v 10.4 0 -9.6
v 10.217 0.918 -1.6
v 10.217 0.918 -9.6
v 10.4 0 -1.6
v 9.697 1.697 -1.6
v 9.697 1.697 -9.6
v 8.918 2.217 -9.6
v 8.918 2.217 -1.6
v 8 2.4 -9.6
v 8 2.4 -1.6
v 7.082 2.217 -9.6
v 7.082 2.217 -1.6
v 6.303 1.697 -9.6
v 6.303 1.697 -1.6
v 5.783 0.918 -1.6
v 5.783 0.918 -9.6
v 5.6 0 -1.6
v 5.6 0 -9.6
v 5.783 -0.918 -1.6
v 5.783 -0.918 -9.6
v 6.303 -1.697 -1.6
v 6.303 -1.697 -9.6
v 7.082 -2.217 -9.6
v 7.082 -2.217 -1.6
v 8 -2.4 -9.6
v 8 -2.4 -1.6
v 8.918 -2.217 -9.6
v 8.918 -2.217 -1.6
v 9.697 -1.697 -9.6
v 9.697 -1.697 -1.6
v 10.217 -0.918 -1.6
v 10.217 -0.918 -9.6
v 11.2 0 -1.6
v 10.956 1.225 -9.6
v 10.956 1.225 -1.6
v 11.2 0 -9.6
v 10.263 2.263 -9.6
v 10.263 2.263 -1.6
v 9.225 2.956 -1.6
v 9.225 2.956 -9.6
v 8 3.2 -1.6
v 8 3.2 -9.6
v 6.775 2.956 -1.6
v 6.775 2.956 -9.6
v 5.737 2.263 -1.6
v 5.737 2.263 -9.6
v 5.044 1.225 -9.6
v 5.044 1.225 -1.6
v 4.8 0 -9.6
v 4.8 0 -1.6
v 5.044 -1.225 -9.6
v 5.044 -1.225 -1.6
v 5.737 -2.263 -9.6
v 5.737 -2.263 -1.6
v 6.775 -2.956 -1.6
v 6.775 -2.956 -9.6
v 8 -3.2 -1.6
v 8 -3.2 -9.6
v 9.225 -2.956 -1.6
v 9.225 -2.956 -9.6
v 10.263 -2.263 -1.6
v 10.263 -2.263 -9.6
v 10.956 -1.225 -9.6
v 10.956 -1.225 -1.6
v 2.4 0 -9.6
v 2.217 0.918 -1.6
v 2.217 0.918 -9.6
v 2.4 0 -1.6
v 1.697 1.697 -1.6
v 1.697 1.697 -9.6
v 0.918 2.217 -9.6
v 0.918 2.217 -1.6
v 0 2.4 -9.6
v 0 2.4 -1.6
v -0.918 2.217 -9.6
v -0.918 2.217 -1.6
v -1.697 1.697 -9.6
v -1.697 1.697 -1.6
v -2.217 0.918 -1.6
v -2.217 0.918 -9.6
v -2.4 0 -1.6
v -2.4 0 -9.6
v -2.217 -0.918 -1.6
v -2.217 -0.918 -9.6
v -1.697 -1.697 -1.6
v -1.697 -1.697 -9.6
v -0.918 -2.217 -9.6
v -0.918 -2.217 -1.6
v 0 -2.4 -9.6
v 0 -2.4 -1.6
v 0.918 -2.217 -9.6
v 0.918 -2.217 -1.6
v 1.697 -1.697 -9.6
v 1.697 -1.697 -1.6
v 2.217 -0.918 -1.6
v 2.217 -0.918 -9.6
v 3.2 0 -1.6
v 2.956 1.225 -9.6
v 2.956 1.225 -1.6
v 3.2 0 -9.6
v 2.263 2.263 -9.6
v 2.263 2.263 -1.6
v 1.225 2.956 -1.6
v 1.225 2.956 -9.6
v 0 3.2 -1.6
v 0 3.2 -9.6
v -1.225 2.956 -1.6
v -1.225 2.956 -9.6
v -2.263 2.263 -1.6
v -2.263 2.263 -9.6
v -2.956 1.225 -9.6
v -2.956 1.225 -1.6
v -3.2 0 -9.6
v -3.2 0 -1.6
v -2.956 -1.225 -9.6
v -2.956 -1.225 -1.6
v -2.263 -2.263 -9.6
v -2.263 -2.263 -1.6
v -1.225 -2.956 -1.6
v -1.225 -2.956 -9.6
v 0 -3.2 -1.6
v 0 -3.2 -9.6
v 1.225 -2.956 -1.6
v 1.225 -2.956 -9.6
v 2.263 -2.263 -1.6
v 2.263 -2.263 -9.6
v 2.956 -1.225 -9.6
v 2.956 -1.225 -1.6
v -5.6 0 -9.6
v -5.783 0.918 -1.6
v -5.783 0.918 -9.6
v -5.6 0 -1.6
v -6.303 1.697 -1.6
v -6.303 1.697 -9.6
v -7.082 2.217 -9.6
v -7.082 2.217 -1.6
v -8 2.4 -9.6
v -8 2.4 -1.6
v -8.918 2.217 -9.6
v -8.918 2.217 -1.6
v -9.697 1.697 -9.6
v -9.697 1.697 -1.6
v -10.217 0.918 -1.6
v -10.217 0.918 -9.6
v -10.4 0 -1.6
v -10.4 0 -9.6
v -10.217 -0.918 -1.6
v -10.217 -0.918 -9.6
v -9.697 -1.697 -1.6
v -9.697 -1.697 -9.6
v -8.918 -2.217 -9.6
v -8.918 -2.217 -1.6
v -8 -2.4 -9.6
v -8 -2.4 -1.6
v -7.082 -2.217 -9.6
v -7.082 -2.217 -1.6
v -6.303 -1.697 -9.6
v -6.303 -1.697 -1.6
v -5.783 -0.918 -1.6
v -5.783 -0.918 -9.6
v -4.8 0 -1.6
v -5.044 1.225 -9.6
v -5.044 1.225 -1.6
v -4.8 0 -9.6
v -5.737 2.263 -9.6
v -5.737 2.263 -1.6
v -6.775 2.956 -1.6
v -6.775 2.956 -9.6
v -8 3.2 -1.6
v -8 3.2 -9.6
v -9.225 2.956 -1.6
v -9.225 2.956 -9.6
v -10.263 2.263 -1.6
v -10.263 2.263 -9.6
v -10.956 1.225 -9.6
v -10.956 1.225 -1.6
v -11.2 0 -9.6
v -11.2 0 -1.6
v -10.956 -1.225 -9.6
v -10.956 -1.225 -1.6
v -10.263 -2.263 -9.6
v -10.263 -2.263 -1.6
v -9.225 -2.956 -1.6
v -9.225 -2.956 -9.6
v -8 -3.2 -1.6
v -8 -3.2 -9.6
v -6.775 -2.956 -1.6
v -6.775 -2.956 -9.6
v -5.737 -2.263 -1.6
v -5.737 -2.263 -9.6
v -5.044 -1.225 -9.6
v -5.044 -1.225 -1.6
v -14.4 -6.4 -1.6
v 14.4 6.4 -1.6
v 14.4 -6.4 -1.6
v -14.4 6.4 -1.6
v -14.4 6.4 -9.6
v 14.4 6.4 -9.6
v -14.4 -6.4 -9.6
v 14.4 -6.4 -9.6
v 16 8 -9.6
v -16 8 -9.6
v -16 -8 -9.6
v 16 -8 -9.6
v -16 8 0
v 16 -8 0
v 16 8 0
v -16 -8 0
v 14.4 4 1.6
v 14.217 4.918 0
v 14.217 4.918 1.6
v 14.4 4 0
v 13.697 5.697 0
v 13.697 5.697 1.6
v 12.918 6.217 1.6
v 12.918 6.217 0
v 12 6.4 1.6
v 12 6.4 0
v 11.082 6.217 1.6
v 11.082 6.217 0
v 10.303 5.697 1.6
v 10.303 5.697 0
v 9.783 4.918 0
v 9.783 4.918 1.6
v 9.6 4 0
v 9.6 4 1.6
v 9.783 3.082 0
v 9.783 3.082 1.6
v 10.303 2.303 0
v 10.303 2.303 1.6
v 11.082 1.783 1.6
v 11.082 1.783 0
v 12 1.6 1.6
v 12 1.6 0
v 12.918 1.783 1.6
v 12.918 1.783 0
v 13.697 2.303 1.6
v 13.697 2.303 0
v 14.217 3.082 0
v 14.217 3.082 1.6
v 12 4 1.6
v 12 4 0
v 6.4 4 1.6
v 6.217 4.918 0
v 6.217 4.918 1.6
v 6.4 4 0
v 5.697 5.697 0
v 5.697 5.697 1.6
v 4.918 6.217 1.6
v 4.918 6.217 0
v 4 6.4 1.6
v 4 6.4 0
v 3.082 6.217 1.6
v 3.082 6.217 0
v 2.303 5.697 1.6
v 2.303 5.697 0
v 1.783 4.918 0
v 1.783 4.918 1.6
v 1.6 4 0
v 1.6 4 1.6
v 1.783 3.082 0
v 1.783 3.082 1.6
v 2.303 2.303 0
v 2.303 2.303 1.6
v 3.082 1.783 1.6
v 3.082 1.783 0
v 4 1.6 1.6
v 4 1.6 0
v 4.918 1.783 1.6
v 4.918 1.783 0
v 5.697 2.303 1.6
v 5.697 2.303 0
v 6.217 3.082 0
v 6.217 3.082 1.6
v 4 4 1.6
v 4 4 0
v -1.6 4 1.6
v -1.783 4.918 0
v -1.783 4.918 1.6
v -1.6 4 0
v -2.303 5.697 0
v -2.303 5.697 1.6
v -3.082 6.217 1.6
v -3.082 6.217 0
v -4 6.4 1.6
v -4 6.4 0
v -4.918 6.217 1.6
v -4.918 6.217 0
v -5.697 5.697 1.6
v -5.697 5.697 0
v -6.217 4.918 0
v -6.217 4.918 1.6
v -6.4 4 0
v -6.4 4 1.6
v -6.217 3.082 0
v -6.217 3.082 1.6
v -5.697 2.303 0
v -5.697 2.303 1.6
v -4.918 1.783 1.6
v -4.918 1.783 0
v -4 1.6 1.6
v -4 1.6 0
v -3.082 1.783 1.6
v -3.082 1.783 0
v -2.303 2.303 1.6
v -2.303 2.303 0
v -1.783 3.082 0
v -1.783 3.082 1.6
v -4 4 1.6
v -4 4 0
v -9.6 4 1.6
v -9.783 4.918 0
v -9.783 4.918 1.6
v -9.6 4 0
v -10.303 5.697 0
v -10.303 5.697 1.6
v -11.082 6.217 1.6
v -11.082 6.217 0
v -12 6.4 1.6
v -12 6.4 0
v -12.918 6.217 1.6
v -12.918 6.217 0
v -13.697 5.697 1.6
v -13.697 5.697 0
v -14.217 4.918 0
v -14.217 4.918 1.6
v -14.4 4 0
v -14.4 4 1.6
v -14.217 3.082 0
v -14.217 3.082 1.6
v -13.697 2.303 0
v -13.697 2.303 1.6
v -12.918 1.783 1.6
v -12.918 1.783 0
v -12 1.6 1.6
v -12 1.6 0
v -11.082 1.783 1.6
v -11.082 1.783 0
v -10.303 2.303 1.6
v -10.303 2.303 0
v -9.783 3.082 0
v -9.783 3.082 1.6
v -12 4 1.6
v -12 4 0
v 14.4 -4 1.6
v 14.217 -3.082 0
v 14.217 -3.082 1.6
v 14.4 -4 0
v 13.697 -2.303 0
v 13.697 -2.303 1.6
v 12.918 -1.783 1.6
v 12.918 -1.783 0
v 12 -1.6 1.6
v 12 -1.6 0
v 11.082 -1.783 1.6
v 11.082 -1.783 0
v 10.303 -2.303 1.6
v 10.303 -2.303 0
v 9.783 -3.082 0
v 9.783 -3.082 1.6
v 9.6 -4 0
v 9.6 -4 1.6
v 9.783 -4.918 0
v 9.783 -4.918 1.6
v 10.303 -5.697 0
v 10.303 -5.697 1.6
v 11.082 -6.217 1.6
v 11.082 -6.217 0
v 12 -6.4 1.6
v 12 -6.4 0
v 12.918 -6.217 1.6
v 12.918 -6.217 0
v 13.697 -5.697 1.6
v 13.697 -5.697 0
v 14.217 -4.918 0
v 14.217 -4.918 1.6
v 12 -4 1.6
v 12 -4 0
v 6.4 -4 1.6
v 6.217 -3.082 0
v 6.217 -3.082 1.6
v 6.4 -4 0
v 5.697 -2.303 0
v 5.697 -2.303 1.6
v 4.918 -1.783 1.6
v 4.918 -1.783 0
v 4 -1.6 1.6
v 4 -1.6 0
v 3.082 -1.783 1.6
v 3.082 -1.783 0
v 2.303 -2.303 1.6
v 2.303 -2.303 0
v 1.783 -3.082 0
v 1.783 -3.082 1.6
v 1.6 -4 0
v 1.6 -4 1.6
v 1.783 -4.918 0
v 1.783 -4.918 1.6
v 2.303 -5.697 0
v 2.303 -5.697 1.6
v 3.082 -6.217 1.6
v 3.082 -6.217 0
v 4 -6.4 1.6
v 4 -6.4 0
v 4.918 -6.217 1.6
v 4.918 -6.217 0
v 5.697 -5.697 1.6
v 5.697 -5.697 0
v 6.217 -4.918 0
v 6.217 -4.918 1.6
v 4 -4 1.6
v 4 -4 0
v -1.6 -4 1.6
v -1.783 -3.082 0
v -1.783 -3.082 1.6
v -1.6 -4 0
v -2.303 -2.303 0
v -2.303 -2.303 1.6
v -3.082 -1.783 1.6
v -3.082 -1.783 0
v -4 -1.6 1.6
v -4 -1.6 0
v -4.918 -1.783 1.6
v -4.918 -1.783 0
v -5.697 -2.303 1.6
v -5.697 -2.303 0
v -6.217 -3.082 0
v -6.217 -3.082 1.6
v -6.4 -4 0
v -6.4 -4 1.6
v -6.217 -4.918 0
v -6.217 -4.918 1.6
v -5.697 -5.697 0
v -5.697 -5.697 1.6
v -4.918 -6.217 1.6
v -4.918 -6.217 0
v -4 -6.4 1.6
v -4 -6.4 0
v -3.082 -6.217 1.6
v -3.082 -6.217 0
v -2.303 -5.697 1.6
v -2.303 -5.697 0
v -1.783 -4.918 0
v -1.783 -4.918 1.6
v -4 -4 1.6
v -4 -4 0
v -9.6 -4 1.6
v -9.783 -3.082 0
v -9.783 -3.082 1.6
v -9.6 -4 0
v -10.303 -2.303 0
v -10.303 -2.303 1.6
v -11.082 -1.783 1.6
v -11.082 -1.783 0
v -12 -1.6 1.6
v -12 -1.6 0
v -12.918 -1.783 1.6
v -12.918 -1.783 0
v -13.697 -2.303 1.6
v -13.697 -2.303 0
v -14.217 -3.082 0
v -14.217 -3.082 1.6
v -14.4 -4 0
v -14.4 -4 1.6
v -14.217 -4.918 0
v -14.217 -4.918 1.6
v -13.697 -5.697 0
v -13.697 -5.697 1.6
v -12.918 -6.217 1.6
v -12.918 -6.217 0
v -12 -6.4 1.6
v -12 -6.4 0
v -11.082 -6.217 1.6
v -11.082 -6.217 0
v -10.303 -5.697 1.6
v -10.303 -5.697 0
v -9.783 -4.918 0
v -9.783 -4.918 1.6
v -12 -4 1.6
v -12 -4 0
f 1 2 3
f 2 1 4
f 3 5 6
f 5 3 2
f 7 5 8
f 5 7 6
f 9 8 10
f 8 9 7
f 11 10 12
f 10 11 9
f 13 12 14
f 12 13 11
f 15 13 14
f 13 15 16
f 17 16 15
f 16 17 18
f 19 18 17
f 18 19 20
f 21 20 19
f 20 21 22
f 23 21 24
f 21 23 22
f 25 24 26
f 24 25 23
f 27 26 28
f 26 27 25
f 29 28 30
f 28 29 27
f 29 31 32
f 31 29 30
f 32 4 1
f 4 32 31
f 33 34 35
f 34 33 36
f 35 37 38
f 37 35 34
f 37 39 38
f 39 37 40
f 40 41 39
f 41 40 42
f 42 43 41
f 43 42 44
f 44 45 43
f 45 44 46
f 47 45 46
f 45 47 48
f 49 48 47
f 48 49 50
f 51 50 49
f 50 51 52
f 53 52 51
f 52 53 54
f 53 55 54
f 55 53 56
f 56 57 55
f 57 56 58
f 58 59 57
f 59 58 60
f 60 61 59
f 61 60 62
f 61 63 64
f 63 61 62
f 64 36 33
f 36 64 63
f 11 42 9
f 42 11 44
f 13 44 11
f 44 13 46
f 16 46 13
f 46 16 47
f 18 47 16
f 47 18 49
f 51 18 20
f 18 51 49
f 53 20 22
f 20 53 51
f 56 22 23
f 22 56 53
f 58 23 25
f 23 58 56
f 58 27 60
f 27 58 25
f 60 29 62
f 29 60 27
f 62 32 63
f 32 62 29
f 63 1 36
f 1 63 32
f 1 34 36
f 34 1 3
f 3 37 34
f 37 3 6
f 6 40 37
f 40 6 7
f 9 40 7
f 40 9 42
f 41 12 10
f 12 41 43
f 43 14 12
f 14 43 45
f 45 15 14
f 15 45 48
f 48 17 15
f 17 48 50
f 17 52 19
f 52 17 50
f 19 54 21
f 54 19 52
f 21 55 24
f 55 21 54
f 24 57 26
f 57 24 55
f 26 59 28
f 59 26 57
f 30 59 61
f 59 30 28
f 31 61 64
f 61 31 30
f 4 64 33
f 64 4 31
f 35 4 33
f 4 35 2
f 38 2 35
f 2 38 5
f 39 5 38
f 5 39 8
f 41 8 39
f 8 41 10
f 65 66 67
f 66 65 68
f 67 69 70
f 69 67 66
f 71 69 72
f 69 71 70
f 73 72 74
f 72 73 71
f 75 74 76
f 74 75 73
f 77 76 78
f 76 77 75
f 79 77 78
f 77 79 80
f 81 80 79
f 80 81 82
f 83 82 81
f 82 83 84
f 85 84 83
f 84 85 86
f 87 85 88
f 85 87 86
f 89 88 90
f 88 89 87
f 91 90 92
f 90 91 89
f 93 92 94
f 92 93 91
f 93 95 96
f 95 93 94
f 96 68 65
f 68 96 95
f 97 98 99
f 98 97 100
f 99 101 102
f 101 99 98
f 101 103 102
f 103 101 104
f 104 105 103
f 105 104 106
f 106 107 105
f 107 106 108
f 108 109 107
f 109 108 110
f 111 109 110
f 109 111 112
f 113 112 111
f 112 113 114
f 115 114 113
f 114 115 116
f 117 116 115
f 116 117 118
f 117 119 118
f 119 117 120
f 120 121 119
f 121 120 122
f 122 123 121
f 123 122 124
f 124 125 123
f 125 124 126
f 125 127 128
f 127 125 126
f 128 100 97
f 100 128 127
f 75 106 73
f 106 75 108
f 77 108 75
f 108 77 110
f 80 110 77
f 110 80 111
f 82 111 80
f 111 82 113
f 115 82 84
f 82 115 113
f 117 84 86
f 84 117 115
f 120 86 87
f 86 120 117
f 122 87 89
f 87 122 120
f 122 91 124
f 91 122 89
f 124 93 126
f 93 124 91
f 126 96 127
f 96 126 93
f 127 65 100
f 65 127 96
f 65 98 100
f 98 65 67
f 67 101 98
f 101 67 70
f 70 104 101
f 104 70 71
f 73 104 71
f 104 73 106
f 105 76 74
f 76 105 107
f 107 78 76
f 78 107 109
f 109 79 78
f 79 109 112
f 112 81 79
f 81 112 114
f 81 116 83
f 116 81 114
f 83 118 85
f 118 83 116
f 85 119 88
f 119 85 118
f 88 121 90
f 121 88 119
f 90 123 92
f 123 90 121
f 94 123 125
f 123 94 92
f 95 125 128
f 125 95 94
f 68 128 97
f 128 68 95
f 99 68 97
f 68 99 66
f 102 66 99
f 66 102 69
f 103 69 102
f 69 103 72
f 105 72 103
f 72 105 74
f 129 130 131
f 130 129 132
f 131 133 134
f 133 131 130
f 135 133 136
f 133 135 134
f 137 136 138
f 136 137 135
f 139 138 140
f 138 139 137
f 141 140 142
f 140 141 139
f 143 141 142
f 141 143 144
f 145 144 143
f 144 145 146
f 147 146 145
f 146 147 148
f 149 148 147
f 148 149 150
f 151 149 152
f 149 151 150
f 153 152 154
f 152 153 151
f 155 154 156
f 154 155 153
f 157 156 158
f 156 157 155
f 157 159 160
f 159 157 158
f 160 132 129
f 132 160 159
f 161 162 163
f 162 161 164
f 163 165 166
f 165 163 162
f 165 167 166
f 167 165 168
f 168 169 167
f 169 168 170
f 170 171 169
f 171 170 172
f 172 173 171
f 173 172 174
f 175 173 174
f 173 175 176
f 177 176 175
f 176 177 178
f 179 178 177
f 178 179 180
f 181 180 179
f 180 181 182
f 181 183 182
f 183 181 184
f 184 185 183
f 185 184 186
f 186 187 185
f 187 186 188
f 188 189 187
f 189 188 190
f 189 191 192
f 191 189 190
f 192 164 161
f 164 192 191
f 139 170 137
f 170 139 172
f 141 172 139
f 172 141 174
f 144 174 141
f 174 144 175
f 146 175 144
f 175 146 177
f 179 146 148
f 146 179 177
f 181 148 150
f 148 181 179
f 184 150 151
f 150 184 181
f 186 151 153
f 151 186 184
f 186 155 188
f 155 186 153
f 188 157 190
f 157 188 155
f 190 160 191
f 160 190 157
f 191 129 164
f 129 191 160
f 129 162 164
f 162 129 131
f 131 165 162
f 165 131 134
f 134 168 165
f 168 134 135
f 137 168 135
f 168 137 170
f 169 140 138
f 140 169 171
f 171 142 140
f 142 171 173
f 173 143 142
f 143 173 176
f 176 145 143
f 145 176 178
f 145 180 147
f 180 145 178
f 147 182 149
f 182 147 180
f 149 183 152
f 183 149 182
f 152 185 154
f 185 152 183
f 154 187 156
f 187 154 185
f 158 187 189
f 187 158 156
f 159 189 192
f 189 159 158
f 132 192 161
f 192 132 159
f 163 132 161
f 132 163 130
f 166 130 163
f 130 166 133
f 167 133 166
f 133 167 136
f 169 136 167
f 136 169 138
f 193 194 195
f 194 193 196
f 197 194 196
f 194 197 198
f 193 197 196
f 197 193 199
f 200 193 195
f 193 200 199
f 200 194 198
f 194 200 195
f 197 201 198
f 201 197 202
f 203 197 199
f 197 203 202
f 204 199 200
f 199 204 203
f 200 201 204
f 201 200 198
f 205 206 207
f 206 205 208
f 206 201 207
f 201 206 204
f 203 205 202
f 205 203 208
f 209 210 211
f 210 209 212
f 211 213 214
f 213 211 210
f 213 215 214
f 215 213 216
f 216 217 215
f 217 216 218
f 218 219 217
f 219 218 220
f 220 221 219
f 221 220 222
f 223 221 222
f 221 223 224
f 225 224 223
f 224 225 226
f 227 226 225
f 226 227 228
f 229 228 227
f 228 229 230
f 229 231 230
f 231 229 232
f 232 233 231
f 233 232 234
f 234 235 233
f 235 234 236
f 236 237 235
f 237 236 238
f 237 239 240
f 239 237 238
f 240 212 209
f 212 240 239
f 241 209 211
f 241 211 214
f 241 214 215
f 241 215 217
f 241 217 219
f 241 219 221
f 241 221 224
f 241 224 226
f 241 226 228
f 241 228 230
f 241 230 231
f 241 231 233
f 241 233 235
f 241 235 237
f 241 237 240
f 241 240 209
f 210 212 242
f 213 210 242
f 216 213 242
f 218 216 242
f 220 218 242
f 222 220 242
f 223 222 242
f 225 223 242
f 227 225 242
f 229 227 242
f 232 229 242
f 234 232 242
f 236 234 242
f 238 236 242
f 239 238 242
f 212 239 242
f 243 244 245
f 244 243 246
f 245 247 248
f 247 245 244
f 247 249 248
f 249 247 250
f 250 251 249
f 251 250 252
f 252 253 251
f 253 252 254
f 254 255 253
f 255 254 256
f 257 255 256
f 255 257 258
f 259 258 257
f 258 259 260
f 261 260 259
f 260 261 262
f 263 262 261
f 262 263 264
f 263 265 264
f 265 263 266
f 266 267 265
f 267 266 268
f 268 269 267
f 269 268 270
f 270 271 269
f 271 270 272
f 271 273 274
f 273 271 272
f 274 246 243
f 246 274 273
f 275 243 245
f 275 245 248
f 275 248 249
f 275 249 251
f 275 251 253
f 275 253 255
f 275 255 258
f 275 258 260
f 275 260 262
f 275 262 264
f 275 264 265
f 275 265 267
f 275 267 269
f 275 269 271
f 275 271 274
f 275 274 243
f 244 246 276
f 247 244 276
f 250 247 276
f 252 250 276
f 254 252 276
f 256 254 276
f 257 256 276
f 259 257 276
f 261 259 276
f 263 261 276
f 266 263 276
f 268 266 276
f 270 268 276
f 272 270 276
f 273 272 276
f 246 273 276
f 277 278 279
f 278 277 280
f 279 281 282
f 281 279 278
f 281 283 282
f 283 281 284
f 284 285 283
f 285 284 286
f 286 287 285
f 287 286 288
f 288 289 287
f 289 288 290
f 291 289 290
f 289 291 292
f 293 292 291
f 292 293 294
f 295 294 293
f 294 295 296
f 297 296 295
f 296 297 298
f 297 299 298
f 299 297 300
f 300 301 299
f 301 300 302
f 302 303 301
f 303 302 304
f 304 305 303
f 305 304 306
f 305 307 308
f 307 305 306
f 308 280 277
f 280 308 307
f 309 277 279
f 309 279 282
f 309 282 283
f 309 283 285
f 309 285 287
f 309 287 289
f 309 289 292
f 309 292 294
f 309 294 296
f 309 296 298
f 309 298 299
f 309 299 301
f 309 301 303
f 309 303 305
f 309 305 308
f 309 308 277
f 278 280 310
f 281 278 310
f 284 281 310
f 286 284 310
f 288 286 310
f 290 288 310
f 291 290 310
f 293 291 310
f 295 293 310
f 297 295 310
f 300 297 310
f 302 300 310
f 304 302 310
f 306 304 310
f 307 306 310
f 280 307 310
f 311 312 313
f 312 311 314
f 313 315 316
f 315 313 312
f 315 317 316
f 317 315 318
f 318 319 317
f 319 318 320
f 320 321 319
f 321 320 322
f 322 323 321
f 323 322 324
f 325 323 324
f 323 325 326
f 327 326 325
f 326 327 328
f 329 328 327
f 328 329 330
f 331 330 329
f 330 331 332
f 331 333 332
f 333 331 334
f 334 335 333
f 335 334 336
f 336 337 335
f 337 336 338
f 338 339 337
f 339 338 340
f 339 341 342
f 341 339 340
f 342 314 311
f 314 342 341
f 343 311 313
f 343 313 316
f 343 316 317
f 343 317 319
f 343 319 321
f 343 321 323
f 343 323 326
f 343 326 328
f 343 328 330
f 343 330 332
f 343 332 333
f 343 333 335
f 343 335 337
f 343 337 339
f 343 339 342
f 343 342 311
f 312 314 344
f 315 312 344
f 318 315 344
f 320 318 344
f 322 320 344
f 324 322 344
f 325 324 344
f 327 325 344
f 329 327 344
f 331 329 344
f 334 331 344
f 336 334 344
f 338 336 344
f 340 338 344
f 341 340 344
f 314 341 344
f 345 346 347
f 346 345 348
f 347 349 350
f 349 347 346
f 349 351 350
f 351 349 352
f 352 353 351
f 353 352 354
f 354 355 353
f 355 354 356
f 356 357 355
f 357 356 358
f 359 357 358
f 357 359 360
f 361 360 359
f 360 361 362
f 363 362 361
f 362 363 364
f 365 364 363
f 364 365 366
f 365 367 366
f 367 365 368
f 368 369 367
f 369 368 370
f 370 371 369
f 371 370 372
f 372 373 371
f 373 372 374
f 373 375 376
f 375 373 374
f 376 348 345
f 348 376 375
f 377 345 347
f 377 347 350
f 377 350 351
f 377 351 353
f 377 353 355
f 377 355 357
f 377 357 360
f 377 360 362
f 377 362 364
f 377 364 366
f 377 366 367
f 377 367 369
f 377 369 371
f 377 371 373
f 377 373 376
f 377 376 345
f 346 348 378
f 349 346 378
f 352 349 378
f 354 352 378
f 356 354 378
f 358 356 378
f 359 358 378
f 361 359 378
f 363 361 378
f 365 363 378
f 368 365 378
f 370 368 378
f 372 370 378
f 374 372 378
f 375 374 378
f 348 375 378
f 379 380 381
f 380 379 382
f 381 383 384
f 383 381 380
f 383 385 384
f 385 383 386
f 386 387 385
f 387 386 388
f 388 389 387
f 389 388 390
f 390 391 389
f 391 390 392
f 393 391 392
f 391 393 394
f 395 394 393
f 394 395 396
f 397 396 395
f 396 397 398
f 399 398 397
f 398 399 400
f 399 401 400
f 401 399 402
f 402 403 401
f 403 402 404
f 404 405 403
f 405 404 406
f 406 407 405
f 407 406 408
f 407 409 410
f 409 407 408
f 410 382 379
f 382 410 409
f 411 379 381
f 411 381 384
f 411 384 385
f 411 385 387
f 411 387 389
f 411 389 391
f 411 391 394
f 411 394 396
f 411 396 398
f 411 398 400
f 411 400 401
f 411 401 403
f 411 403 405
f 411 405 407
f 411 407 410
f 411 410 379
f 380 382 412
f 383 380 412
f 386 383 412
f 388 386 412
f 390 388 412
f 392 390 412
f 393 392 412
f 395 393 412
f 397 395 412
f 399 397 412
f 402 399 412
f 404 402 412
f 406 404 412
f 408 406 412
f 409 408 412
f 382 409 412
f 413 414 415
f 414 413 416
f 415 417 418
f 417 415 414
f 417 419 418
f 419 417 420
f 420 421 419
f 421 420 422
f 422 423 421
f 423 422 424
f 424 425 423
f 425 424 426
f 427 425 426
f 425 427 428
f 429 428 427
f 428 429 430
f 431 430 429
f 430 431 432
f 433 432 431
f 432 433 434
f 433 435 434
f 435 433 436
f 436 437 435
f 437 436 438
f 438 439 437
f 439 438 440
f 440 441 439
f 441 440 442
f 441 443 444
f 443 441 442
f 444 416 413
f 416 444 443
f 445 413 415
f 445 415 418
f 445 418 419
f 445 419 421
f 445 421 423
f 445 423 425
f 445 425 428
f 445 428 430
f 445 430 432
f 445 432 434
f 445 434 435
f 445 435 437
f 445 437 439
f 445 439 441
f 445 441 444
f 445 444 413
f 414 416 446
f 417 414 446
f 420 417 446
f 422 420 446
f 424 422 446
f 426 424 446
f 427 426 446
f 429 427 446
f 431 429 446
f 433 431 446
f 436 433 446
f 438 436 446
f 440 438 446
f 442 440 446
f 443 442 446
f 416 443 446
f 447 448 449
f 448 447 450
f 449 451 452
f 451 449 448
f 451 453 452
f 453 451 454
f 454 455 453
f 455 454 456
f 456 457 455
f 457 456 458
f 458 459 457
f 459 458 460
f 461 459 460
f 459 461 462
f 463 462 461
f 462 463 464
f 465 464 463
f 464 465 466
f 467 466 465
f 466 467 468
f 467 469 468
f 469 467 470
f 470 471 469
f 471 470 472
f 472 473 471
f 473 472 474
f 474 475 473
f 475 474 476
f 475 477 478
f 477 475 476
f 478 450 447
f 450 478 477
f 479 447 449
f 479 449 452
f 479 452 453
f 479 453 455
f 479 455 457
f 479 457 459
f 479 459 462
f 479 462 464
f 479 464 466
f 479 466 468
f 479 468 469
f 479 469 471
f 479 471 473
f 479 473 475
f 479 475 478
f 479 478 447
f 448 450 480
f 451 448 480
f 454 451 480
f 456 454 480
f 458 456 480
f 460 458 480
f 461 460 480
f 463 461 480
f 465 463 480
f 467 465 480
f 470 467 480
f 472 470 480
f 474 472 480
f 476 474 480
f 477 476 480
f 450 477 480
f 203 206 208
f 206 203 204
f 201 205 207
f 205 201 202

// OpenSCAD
// file: ../p/4-4ring3.scad
use <../lib.scad>
$fa=1; $fs=0.2;
function ldraw_lib__4_4ring3(realsolid=false) = [
// 0 Ring  3 x 1.0
// 0 Name: 4-4ring3.dat
// 0 Author: James Jessiman
// 0 !LDRAW_ORG Primitive UPDATE 2009-01
// 0 !LICENSE Licensed under CC BY 2.0 and CC BY 4.0 : see CAreadme.txt
// 
// 0 BFC CERTIFY CCW
  [0,"BFC","CERTIFY"],
  [0,"BFC","CCW"],
// 
// 0 !HISTORY 1998-12-15 [PTadmin] Official Update 1998-10
// 0 !HISTORY 2002-04-05 [hafhead] Added BFC statement
// 0 !HISTORY 2002-04-25 [PTadmin] Official Update 2002-02
// 0 !HISTORY 2007-06-24 [PTadmin] Header formatted for Contributor Agreement
// 0 !HISTORY 2008-07-01 [PTadmin] Official Update 2008-01
// 0 !HISTORY 2008-08-26 [cwdee] Switch polygon winding and rename
// 0 !HISTORY 2009-05-02 [PTadmin] Official Update 2009-01
// 
// 
// 4 16 -1.5308 0 3.6956 -1.1481 0 2.7717 0 0 3 0 0 4
  [4,16,-1.5308,0,3.6956,-1.1481,0,2.7717,0,0,3,0,0,4],
// 4 16 -2.8284 0 2.8284 -2.1213 0 2.1213 -1.1481 0 2.7717 -1.5308 0 3.6956
  [4,16,-2.8284,0,2.8284,-2.1213,0,2.1213,-1.1481,0,2.7717,-1.5308,0,3.6956],
// 4 16 -3.6956 0 1.5308 -2.7717 0 1.1481 -2.1213 0 2.1213 -2.8284 0 2.8284
  [4,16,-3.6956,0,1.5308,-2.7717,0,1.1481,-2.1213,0,2.1213,-2.8284,0,2.8284],
// 4 16 -4 0 0 -3 0 0 -2.7717 0 1.1481 -3.6956 0 1.5308
  [4,16,-4,0,0,-3,0,0,-2.7717,0,1.1481,-3.6956,0,1.5308],
// 4 16 -3.6956 0 -1.5308 -2.7717 0 -1.1481 -3 0 0 -4 0 0
  [4,16,-3.6956,0,-1.5308,-2.7717,0,-1.1481,-3,0,0,-4,0,0],
// 4 16 -2.8284 0 -2.8284 -2.1213 0 -2.1213 -2.7717 0 -1.1481 -3.6956 0 -1.5308
  [4,16,-2.8284,0,-2.8284,-2.1213,0,-2.1213,-2.7717,0,-1.1481,-3.6956,0,-1.5308],
// 4 16 -1.5308 0 -3.6956 -1.1481 0 -2.7717 -2.1213 0 -2.1213 -2.8284 0 -2.8284
  [4,16,-1.5308,0,-3.6956,-1.1481,0,-2.7717,-2.1213,0,-2.1213,-2.8284,0,-2.8284],
// 4 16 0 0 -4 0 0 -3 -1.1481 0 -2.7717 -1.5308 0 -3.6956
  [4,16,0,0,-4,0,0,-3,-1.1481,0,-2.7717,-1.5308,0,-3.6956],
// 4 16 1.5308 0 -3.6956 1.1481 0 -2.7717 0 0 -3 0 0 -4
  [4,16,1.5308,0,-3.6956,1.1481,0,-2.7717,0,0,-3,0,0,-4],
// 4 16 2.8284 0 -2.8284 2.1213 0 -2.1213 1.1481 0 -2.7717 1.5308 0 -3.6956
  [4,16,2.8284,0,-2.8284,2.1213,0,-2.1213,1.1481,0,-2.7717,1.5308,0,-3.6956],
// 4 16 3.6956 0 -1.5308 2.7717 0 -1.1481 2.1213 0 -2.1213 2.8284 0 -2.8284
  [4,16,3.6956,0,-1.5308,2.7717,0,-1.1481,2.1213,0,-2.1213,2.8284,0,-2.8284],
// 4 16 4 0 0 3 0 0 2.7717 0 -1.1481 3.6956 0 -1.5308
  [4,16,4,0,0,3,0,0,2.7717,0,-1.1481,3.6956,0,-1.5308],
// 4 16 3.6956 0 1.5308 2.7717 0 1.1481 3 0 0 4 0 0
  [4,16,3.6956,0,1.5308,2.7717,0,1.1481,3,0,0,4,0,0],
// 4 16 2.8284 0 2.8284 2.1213 0 2.1213 2.7717 0 1.1481 3.6956 0 1.5308
  [4,16,2.8284,0,2.8284,2.1213,0,2.1213,2.7717,0,1.1481,3.6956,0,1.5308],
// 4 16 1.5308 0 3.6956 1.1481 0 2.7717 2.1213 0 2.1213 2.8284 0 2.8284
  [4,16,1.5308,0,3.6956,1.1481,0,2.7717,2.1213,0,2.1213,2.8284,0,2.8284],
// 4 16 0 0 4 0 0 3 1.1481 0 2.7717 1.5308 0 3.6956
  [4,16,0,0,4,0,0,3,1.1481,0,2.7717,1.5308,0,3.6956],
// 0
];
module ldraw_lib__4_4ring3(step=0, col=false, unit=2/5, alt=false, line=0.2, solid=!$preview)
    makepoly(ldraw_lib__4_4ring3(solid), step=step, col=col, unit=unit, alt=alt, line=line, solid=solid);
ldraw_lib__4_4ring3(line=0.2);
// file: ../p/4-4edge.scad
use <../lib.scad>
function ldraw_lib__4_4edge() = [
// 0 Circle 1.0
// 0 Name: 4-4edge.dat
// 0 Author: James Jessiman
// 0 !LDRAW_ORG Primitive UPDATE 2017-01
// 0 !LICENSE Licensed under CC BY 2.0 and CC BY 4.0 : see CAreadme.txt
// 
// 0 BFC CERTIFY CCW
  [0,"BFC","CERTIFY"],
  [0,"BFC","CCW"],
// 
// 0 !HISTORY 1998-12-15 [PTadmin] Official Update 1998-10
// 0 !HISTORY 2005-12-28 [PTadmin] Official Update 2005-01
// 0 !HISTORY 2007-06-24 [PTadmin] Header formatted for Contributor Agreement
// 0 !HISTORY 2008-07-01 [PTadmin] Official Update 2008-01
// 0 !HISTORY 2017-01-15 [Steffen] BFCed
// 0 !HISTORY 2017-12-30 [PTadmin] Official Update 2017-01
// 
// 
// 2 24 1 0 0 0.9239 0 0.3827
  [2,24,1,0,0,0.9239,0,0.3827],
// 2 24 0.9239 0 0.3827 0.7071 0 0.7071
  [2,24,0.9239,0,0.3827,0.7071,0,0.7071],
// 2 24 0.7071 0 0.7071 0.3827 0 0.9239
  [2,24,0.7071,0,0.7071,0.3827,0,0.9239],
// 2 24 0.3827 0 0.9239 0 0 1
  [2,24,0.3827,0,0.9239,0,0,1],
// 2 24 0 0 1 -0.3827 0 0.9239
  [2,24,0,0,1,-0.3827,0,0.9239],
// 2 24 -0.3827 0 0.9239 -0.7071 0 0.7071
  [2,24,-0.3827,0,0.9239,-0.7071,0,0.7071],
// 2 24 -0.7071 0 0.7071 -0.9239 0 0.3827
  [2,24,-0.7071,0,0.7071,-0.9239,0,0.3827],
// 2 24 -0.9239 0 0.3827 -1 0 -0
  [2,24,-0.9239,0,0.3827,-1,0,-0],
// 2 24 -1 0 -0 -0.9239 0 -0.3827
  [2,24,-1,0,-0,-0.9239,0,-0.3827],
// 2 24 -0.9239 0 -0.3827 -0.7071 0 -0.7071
  [2,24,-0.9239,0,-0.3827,-0.7071,0,-0.7071],
// 2 24 -0.7071 0 -0.7071 -0.3827 0 -0.9239
  [2,24,-0.7071,0,-0.7071,-0.3827,0,-0.9239],
// 2 24 -0.3827 0 -0.9239 0 0 -1
  [2,24,-0.3827,0,-0.9239,0,0,-1],
// 2 24 0 0 -1 0.3827 0 -0.9239
  [2,24,0,0,-1,0.3827,0,-0.9239],
// 2 24 0.3827 0 -0.9239 0.7071 0 -0.7071
  [2,24,0.3827,0,-0.9239,0.7071,0,-0.7071],
// 2 24 0.7071 0 -0.7071 0.9239 0 -0.3827
  [2,24,0.7071,0,-0.7071,0.9239,0,-0.3827],
// 2 24 0.9239 0 -0.3827 1 0 0
  [2,24,0.9239,0,-0.3827,1,0,0],
];
module ldraw_lib__4_4edge(step=0, col=false, unit=2/5, alt=false, line=0.2, solid=!$preview)
    makepoly(ldraw_lib__4_4edge(), step=step, col=col, unit=unit, alt=alt, line=line, solid=solid);
ldraw_lib__4_4edge(line=0.2);
// file: ../p/4-4disc.scad
use <../lib.scad>
function ldraw_lib__4_4disc() = [
// 0 Disc 1.0
// 0 Name: 4-4disc.dat
// 0 Author: James Jessiman
// 0 !LDRAW_ORG Primitive UPDATE 2002-02
// 0 !LICENSE Licensed under CC BY 2.0 and CC BY 4.0 : see CAreadme.txt
// 
// 0 BFC CERTIFY CCW
  [0,"BFC","CERTIFY"],
  [0,"BFC","CCW"],
// 
// 0 !HISTORY 1998-12-15 [PTadmin] Official Update 1998-10
// 0 !HISTORY 2002-03-23 [sbliss] Added BFC statement
// 0 !HISTORY 2002-04-25 [PTadmin] Official Update 2002-02
// 0 !HISTORY 2007-06-24 [PTadmin] Header formatted for Contributor Agreement
// 0 !HISTORY 2008-07-01 [PTadmin] Official Update 2008-01
// 
// 
// 3 16 0 0 0 1 0 0 0.9239 0 0.3827
  [3,16,0,0,0,1,0,0,0.9239,0,0.3827],
// 3 16 0 0 0 0.9239 0 0.3827 0.7071 0 0.7071
  [3,16,0,0,0,0.9239,0,0.3827,0.7071,0,0.7071],
// 3 16 0 0 0 0.7071 0 0.7071 0.3827 0 0.9239
  [3,16,0,0,0,0.7071,0,0.7071,0.3827,0,0.9239],
// 3 16 0 0 0 0.3827 0 0.9239 0 0 1
  [3,16,0,0,0,0.3827,0,0.9239,0,0,1],
// 3 16 0 0 0 0 0 1 -0.3827 0 0.9239
  [3,16,0,0,0,0,0,1,-0.3827,0,0.9239],
// 3 16 0 0 0 -0.3827 0 0.9239 -0.7071 0 0.7071
  [3,16,0,0,0,-0.3827,0,0.9239,-0.7071,0,0.7071],
// 3 16 0 0 0 -0.7071 0 0.7071 -0.9239 0 0.3827
  [3,16,0,0,0,-0.7071,0,0.7071,-0.9239,0,0.3827],
// 3 16 0 0 0 -0.9239 0 0.3827 -1 0 -0
  [3,16,0,0,0,-0.9239,0,0.3827,-1,0,-0],
// 3 16 0 0 0 -1 0 -0 -0.9239 0 -0.3827
  [3,16,0,0,0,-1,0,-0,-0.9239,0,-0.3827],
// 3 16 0 0 0 -0.9239 0 -0.3827 -0.7071 0 -0.7071
  [3,16,0,0,0,-0.9239,0,-0.3827,-0.7071,0,-0.7071],
// 3 16 0 0 0 -0.7071 0 -0.7071 -0.3827 0 -0.9239
  [3,16,0,0,0,-0.7071,0,-0.7071,-0.3827,0,-0.9239],
// 3 16 0 0 0 -0.3827 0 -0.9239 0 0 -1
  [3,16,0,0,0,-0.3827,0,-0.9239,0,0,-1],
// 3 16 0 0 0 0 0 -1 0.3827 0 -0.9239
  [3,16,0,0,0,0,0,-1,0.3827,0,-0.9239],
// 3 16 0 0 0 0.3827 0 -0.9239 0.7071 0 -0.7071
  [3,16,0,0,0,0.3827,0,-0.9239,0.7071,0,-0.7071],
// 3 16 0 0 0 0.7071 0 -0.7071 0.9239 0 -0.3827
  [3,16,0,0,0,0.7071,0,-0.7071,0.9239,0,-0.3827],
// 3 16 0 0 0 0.9239 0 -0.3827 1 0 0
  [3,16,0,0,0,0.9239,0,-0.3827,1,0,0],
// 0
];
module ldraw_lib__4_4disc(step=0, col=false, unit=2/5, alt=false, line=0.2, solid=!$preview)
    makepoly(ldraw_lib__4_4disc(), step=step, col=col, unit=unit, alt=alt, line=line, solid=solid);
ldraw_lib__4_4disc(line=0.2);
// file: ../p/4-4cyli.scad
use <../lib.scad>
$fa=1; $fs=0.2;
function ldraw_lib__4_4cyli(realsolid=false) = [
// 0 Cylinder 1.0
// 0 Name: 4-4cyli.dat
// 0 Author: James Jessiman
// 0 !LDRAW_ORG Primitive UPDATE 2005-01
// 0 !LICENSE Licensed under CC BY 2.0 and CC BY 4.0 : see CAreadme.txt
// 
// 0 BFC CERTIFY CCW
  [0,"BFC","CERTIFY"],
  [0,"BFC","CCW"],
// 
// 0 !HISTORY 1998-12-15 [PTadmin] Official Update 1998-10
// 0 !HISTORY 2002-03-23 [sbliss] Added BFC statement; merged headers from files in distributions LDraw 0.27 and Complete.
// 0 !HISTORY 2002-04-25 [PTadmin] Official Update 2002-02
// 0 !HISTORY 2004-12-14 [guyvivan] BFC CCW
// 0 !HISTORY 2005-12-28 [PTadmin] Official Update 2005-01
// 0 !HISTORY 2007-06-24 [PTadmin] Header formatted for Contributor Agreement
// 0 !HISTORY 2008-07-01 [PTadmin] Official Update 2008-01
// 
// 
// 4 16 1 1 0 0.9239 1 0.3827 0.9239 0 0.3827 1 0 0
  [4,16,1,1,0,0.9239,1,0.3827,0.9239,0,0.3827,1,0,0],
// 5 24 1 0 0 1 1 0 0.9239 0 0.3827 0.9239 0 -0.3827
  [5,24,1,0,0,1,1,0,0.9239,0,0.3827,0.9239,0,-0.3827],
// 4 16 0.9239 1 0.3827 0.7071 1 0.7071 0.7071 0 0.7071 0.9239 0 0.3827
  [4,16,0.9239,1,0.3827,0.7071,1,0.7071,0.7071,0,0.7071,0.9239,0,0.3827],
// 5 24 0.9239 0 0.3827 0.9239 1 0.3827 0.7071 0 0.7071 1 0 0
  [5,24,0.9239,0,0.3827,0.9239,1,0.3827,0.7071,0,0.7071,1,0,0],
// 4 16 0.7071 1 0.7071 0.3827 1 0.9239 0.3827 0 0.9239 0.7071 0 0.7071
  [4,16,0.7071,1,0.7071,0.3827,1,0.9239,0.3827,0,0.9239,0.7071,0,0.7071],
// 5 24 0.7071 0 0.7071 0.7071 1 0.7071 0.3827 0 0.9239 0.9239 0 0.3827
  [5,24,0.7071,0,0.7071,0.7071,1,0.7071,0.3827,0,0.9239,0.9239,0,0.3827],
// 4 16 0.3827 1 0.9239 0 1 1 0 0 1 0.3827 0 0.9239
  [4,16,0.3827,1,0.9239,0,1,1,0,0,1,0.3827,0,0.9239],
// 5 24 0.3827 0 0.9239 0.3827 1 0.9239 0 0 1 0.7071 0 0.7071
  [5,24,0.3827,0,0.9239,0.3827,1,0.9239,0,0,1,0.7071,0,0.7071],
// 4 16 0 1 1 -0.3827 1 0.9239 -0.3827 0 0.9239 0 0 1
  [4,16,0,1,1,-0.3827,1,0.9239,-0.3827,0,0.9239,0,0,1],
// 5 24 0 0 1 0 1 1 -0.3827 0 0.9239 0.3827 0 0.9239
  [5,24,0,0,1,0,1,1,-0.3827,0,0.9239,0.3827,0,0.9239],
// 4 16 -0.3827 1 0.9239 -0.7071 1 0.7071 -0.7071 0 0.7071 -0.3827 0 0.9239
  [4,16,-0.3827,1,0.9239,-0.7071,1,0.7071,-0.7071,0,0.7071,-0.3827,0,0.9239],
// 5 24 -0.3827 0 0.9239 -0.3827 1 0.9239 -0.7071 0 0.7071 0 0 1
  [5,24,-0.3827,0,0.9239,-0.3827,1,0.9239,-0.7071,0,0.7071,0,0,1],
// 4 16 -0.7071 1 0.7071 -0.9239 1 0.3827 -0.9239 0 0.3827 -0.7071 0 0.7071
  [4,16,-0.7071,1,0.7071,-0.9239,1,0.3827,-0.9239,0,0.3827,-0.7071,0,0.7071],
// 5 24 -0.7071 0 0.7071 -0.7071 1 0.7071 -0.9239 0 0.3827 -0.3827 0 0.9239
  [5,24,-0.7071,0,0.7071,-0.7071,1,0.7071,-0.9239,0,0.3827,-0.3827,0,0.9239],
// 4 16 -0.9239 1 0.3827 -1 1 0 -1 0 0 -0.9239 0 0.3827
  [4,16,-0.9239,1,0.3827,-1,1,0,-1,0,0,-0.9239,0,0.3827],
// 5 24 -0.9239 0 0.3827 -0.9239 1 0.3827 -1 0 0 -0.7071 0 0.7071
  [5,24,-0.9239,0,0.3827,-0.9239,1,0.3827,-1,0,0,-0.7071,0,0.7071],
// 4 16 -1 1 0 -0.9239 1 -0.3827 -0.9239 0 -0.3827 -1 0 0
  [4,16,-1,1,0,-0.9239,1,-0.3827,-0.9239,0,-0.3827,-1,0,0],
// 5 24 -1 0 0 -1 1 0 -0.9239 0 -0.3827 -0.9239 0 0.3827
  [5,24,-1,0,0,-1,1,0,-0.9239,0,-0.3827,-0.9239,0,0.3827],
// 4 16 -0.9239 1 -0.3827 -0.7071 1 -0.7071 -0.7071 0 -0.7071 -0.9239 0 -0.3827
  [4,16,-0.9239,1,-0.3827,-0.7071,1,-0.7071,-0.7071,0,-0.7071,-0.9239,0,-0.3827],
// 5 24 -0.9239 0 -0.3827 -0.9239 1 -0.3827 -0.7071 0 -0.7071 -1 0 0
  [5,24,-0.9239,0,-0.3827,-0.9239,1,-0.3827,-0.7071,0,-0.7071,-1,0,0],
// 4 16 -0.7071 1 -0.7071 -0.3827 1 -0.9239 -0.3827 0 -0.9239 -0.7071 0 -0.7071
  [4,16,-0.7071,1,-0.7071,-0.3827,1,-0.9239,-0.3827,0,-0.9239,-0.7071,0,-0.7071],
// 5 24 -0.7071 0 -0.7071 -0.7071 1 -0.7071 -0.3827 0 -0.9239 -0.9239 0 -0.3827
  [5,24,-0.7071,0,-0.7071,-0.7071,1,-0.7071,-0.3827,0,-0.9239,-0.9239,0,-0.3827],
// 4 16 -0.3827 1 -0.9239 0 1 -1 0 0 -1 -0.3827 0 -0.9239
  [4,16,-0.3827,1,-0.9239,0,1,-1,0,0,-1,-0.3827,0,-0.9239],
// 5 24 -0.3827 0 -0.9239 -0.3827 1 -0.9239 0 0 -1 -0.7071 0 -0.7071
  [5,24,-0.3827,0,-0.9239,-0.3827,1,-0.9239,0,0,-1,-0.7071,0,-0.7071],
// 4 16 0 1 -1 0.3827 1 -0.9239 0.3827 0 -0.9239 0 0 -1
  [4,16,0,1,-1,0.3827,1,-0.9239,0.3827,0,-0.9239,0,0,-1],
// 5 24 0 0 -1 0 1 -1 0.3827 0 -0.9239 -0.3827 0 -0.9239
  [5,24,0,0,-1,0,1,-1,0.3827,0,-0.9239,-0.3827,0,-0.9239],
// 4 16 0.3827 1 -0.9239 0.7071 1 -0.7071 0.7071 0 -0.7071 0.3827 0 -0.9239
  [4,16,0.3827,1,-0.9239,0.7071,1,-0.7071,0.7071,0,-0.7071,0.3827,0,-0.9239],
// 5 24 0.3827 0 -0.9239 0.3827 1 -0.9239 0.7071 0 -0.7071 0 0 -1
  [5,24,0.3827,0,-0.9239,0.3827,1,-0.9239,0.7071,0,-0.7071,0,0,-1],
// 4 16 0.7071 1 -0.7071 0.9239 1 -0.3827 0.9239 0 -0.3827 0.7071 0 -0.7071
  [4,16,0.7071,1,-0.7071,0.9239,1,-0.3827,0.9239,0,-0.3827,0.7071,0,-0.7071],
// 5 24 0.7071 0 -0.7071 0.7071 1 -0.7071 0.9239 0 -0.3827 0.3827 0 -0.9239
  [5,24,0.7071,0,-0.7071,0.7071,1,-0.7071,0.9239,0,-0.3827,0.3827,0,-0.9239],
// 4 16 0.9239 1 -0.3827 1 1 0 1 0 0 0.9239 0 -0.3827
  [4,16,0.9239,1,-0.3827,1,1,0,1,0,0,0.9239,0,-0.3827],
// 5 24 0.9239 0 -0.3827 0.9239 1 -0.3827 1 0 0 0.7071 0 -0.7071
  [5,24,0.9239,0,-0.3827,0.9239,1,-0.3827,1,0,0,0.7071,0,-0.7071],
// 0
];
module ldraw_lib__4_4cyli(step=0, col=false, unit=2/5, alt=false, line=0.2, solid=!$preview)
    makepoly(ldraw_lib__4_4cyli(solid), step=step, col=col, unit=unit, alt=alt, line=line, solid=solid);
ldraw_lib__4_4cyli(line=0.2);
// file: ../p/stud4.scad
use <../lib.scad>
use <4-4cyli.scad>
use <4-4edge.scad>
use <4-4ring3.scad>
function ldraw_lib__stud4() = [
// 0 Stud Tube Open
// 0 Name: stud4.dat
// 0 Author: James Jessiman
// 0 !LDRAW_ORG Primitive UPDATE 2009-02
// 0 !LICENSE Licensed under CC BY 4.0 : see CAreadme.txt
// 
// 0 BFC CERTIFY CCW
  [0,"BFC","CERTIFY"],
  [0,"BFC","CCW"],
// 
// 0 !HISTORY 1999-07-05 [PTadmin] Official Update 1999-05
// 0 !HISTORY 2002-04-04 [sbliss] Modified for BFC compliance
// 0 !HISTORY 2002-04-25 [PTadmin] Official Update 2002-02
// 0 !HISTORY 2007-06-24 [PTadmin] Header formatted for Contributor Agreement
// 0 !HISTORY 2008-07-01 [PTadmin] Official Update 2008-01
// 0 !HISTORY 2009-06-21 [cwdee] Update ring references to 4-4ring
// 0 !HISTORY 2009-09-03 [PTadmin] Official Update 2009-02
// 
// 
// 1 16 0 -4 0 6 0 0 0 1 0 0 0 6 4-4edge.dat
  [1,16,0,-4,0,6,0,0,0,1,0,0,0,6, ldraw_lib__4_4edge()],
// 1 16 0 -4 0 8 0 0 0 1 0 0 0 8 4-4edge.dat
  [1,16,0,-4,0,8,0,0,0,1,0,0,0,8, ldraw_lib__4_4edge()],
// 1 16 0 0 0 6 0 0 0 1 0 0 0 6 4-4edge.dat
  [1,16,0,0,0,6,0,0,0,1,0,0,0,6, ldraw_lib__4_4edge()],
// 1 16 0 0 0 8 0 0 0 1 0 0 0 8 4-4edge.dat
  [1,16,0,0,0,8,0,0,0,1,0,0,0,8, ldraw_lib__4_4edge()],
// 0 BFC INVERTNEXT
  [0,"BFC","INVERTNEXT"],
// 1 16 0 -4 0 6 0 0 0 4 0 0 0 6 4-4cyli.dat
  [1,16,0,-4,0,6,0,0,0,4,0,0,0,6, ldraw_lib__4_4cyli()],
// 1 16 0 -4 0 8 0 0 0 4 0 0 0 8 4-4cyli.dat
  [1,16,0,-4,0,8,0,0,0,4,0,0,0,8, ldraw_lib__4_4cyli()],
// 1 16 0 -4 0 2 0 0 0 1 0 0 0 2 4-4ring3.dat
  [1,16,0,-4,0,2,0,0,0,1,0,0,0,2, ldraw_lib__4_4ring3()],
  [-1,16,0,0,0,2,0,0,0,-1,0,0,0,2, ldraw_lib__4_4ring3()],
// 0
];
module ldraw_lib__stud4(step=0, col=false, unit=2/5, alt=false, line=0.2, solid=!$preview)
    makepoly(ldraw_lib__stud4(), step=step, col=col, unit=unit, alt=alt, line=line, solid=solid);
ldraw_lib__stud4(line=0.2);
// file: ../p/stud.scad
use <../lib.scad>
use <4-4cyli.scad>
use <4-4disc.scad>
use <4-4edge.scad>
function ldraw_lib__stud() = [
// 0 Stud
// 0 Name: stud.dat
// 0 Author: James Jessiman
// 0 !LDRAW_ORG Primitive UPDATE 2012-01
// 0 !LICENSE Licensed under CC BY 4.0 : see CAreadme.txt
// 
// 0 BFC CERTIFY CCW
  [0,"BFC","CERTIFY"],
  [0,"BFC","CCW"],
// 
// 0 !HISTORY 2002-04-04 [sbliss] Modified for BFC compliance
// 0 !HISTORY 2002-04-25 [PTadmin] Official Update 2002-02
// 0 !HISTORY 2007-06-24 [PTadmin] Header formatted for Contributor Agreement
// 0 !HISTORY 2008-07-01 [PTadmin] Official Update 2008-01
// 0 !HISTORY 2012-02-16 [Philo] Changed to CCW
// 0 !HISTORY 2012-03-30 [PTadmin] Official Update 2012-01
// 
// 
// 1 16 0 0 0 6 0 0 0 1 0 0 0 6 4-4edge.dat
  [1,16,0,0,0,6,0,0,0,1,0,0,0,6, ldraw_lib__4_4edge()],
// 1 16 0 -4 0 6 0 0 0 1 0 0 0 6 4-4edge.dat
  [1,16,0,-4,0,6,0,0,0,1,0,0,0,6, ldraw_lib__4_4edge()],
// 1 16 0 0 0 6 0 0 0 -4 0 0 0 6 4-4cyli.dat
  [1,16,0,0,0,6,0,0,0,-4,0,0,0,6, ldraw_lib__4_4cyli()],
// 1 16 0 -4 0 6 0 0 0 1 0 0 0 6 4-4disc.dat
  [1,16,0,-4,0,6,0,0,0,1,0,0,0,6, ldraw_lib__4_4disc()],
  [-1,16,0,0,0,6,0,0,0,-1,0,0,0,6, ldraw_lib__4_4disc()],
];
module ldraw_lib__stud(step=0, col=false, unit=2/5, alt=false, line=0.2, solid=!$preview)
    makepoly(ldraw_lib__stud(), step=step, col=col, unit=unit, alt=alt, line=line, solid=solid);
ldraw_lib__stud(line=0.2);
// file: ../p/box5.scad
use <../lib.scad>
function ldraw_lib__box5() = [
// 0 Box with 5 Faces and All Edges
// 0 Name: box5.dat
// 0 Author: James Jessiman
// 0 !LDRAW_ORG Primitive UPDATE 2012-01
// 0 !LICENSE Licensed under CC BY 2.0 and CC BY 4.0 : see CAreadme.txt
// 
// 0 BFC CERTIFY CCW
  [0,"BFC","CERTIFY"],
  [0,"BFC","CCW"],
// 
// 0 !HISTORY 2002-04-03 [sbliss] Modified for BFC compliance
// 0 !HISTORY 2002-04-25 [PTadmin] Official Update 2002-02
// 0 !HISTORY 2007-06-24 [PTadmin] Header formatted for Contributor Agreement
// 0 !HISTORY 2008-07-01 [PTadmin] Official Update 2008-01
// 0 !HISTORY 2012-02-16 [Philo] Changed to CCW
// 0 !HISTORY 2012-03-30 [PTadmin] Official Update 2012-01
// 
// 
// 2 24 1 1 1 -1 1 1
  [2,24,1,1,1,-1,1,1],
// 2 24 -1 1 1 -1 1 -1
  [2,24,-1,1,1,-1,1,-1],
// 2 24 -1 1 -1 1 1 -1
  [2,24,-1,1,-1,1,1,-1],
// 2 24 1 1 -1 1 1 1
  [2,24,1,1,-1,1,1,1],
// 2 24 1 0 1 -1 0 1
  [2,24,1,0,1,-1,0,1],
// 2 24 -1 0 1 -1 0 -1
  [2,24,-1,0,1,-1,0,-1],
// 2 24 -1 0 -1 1 0 -1
  [2,24,-1,0,-1,1,0,-1],
// 2 24 1 0 -1 1 0 1
  [2,24,1,0,-1,1,0,1],
// 2 24 1 0 1 1 1 1
  [2,24,1,0,1,1,1,1],
// 2 24 -1 0 1 -1 1 1
  [2,24,-1,0,1,-1,1,1],
// 2 24 1 0 -1 1 1 -1
  [2,24,1,0,-1,1,1,-1],
// 2 24 -1 0 -1 -1 1 -1
  [2,24,-1,0,-1,-1,1,-1],
// 4 16 -1 1 1 1 1 1 1 1 -1 -1 1 -1
  [4,16,-1,1,1,1,1,1,1,1,-1,-1,1,-1],
// 4 16 -1 1 1 -1 0 1 1 0 1 1 1 1
  [4,16,-1,1,1,-1,0,1,1,0,1,1,1,1],
// 4 16 -1 1 -1 -1 0 -1 -1 0 1 -1 1 1
  [4,16,-1,1,-1,-1,0,-1,-1,0,1,-1,1,1],
// 4 16 1 1 -1 1 0 -1 -1 0 -1 -1 1 -1
  [4,16,1,1,-1,1,0,-1,-1,0,-1,-1,1,-1],
// 4 16 1 1 1 1 0 1 1 0 -1 1 1 -1
  [4,16,1,1,1,1,0,1,1,0,-1,1,1,-1],
];
makepoly(ldraw_lib__box5(), line=0.2);
// file: ../p/box3u2p.scad
use <../lib.scad>
function ldraw_lib__box3u2p() = [
// 0 Box with 3 Faces without 2 Parallel Edges
// 0 Name: box3u2p.dat
// 0 Author: Niels Karsdorp [nielsk]
// 0 !LDRAW_ORG Primitive UPDATE 2012-01
// 0 !LICENSE Licensed under CC BY 2.0 and CC BY 4.0 : see CAreadme.txt
// 
// 0 BFC CERTIFY CCW
  [0,"BFC","CERTIFY"],
  [0,"BFC","CCW"],
// 
// 0 !HISTORY 2003-03-12 [PTadmin] Official Update 2003-01
// 0 !HISTORY 2007-06-24 [PTadmin] Header formatted for Contributor Agreement
// 0 !HISTORY 2008-07-01 [PTadmin] Official Update 2008-01
// 0 !HISTORY 2012-02-16 [Philo] Changed to CCW
// 0 !HISTORY 2012-03-30 [PTadmin] Official Update 2012-01
// 
// 
// 2 24 1 1 1 -1 1 1
  [2,24,1,1,1,-1,1,1],
// 2 24 -1 1 -1 1 1 -1
  [2,24,-1,1,-1,1,1,-1],
// 2 24 1 0 1 -1 0 1
  [2,24,1,0,1,-1,0,1],
// 2 24 -1 0 -1 1 0 -1
  [2,24,-1,0,-1,1,0,-1],
// 2 24 1 1 1 1 1 -1
  [2,24,1,1,1,1,1,-1],
// 2 24 -1 1 1 -1 1 -1
  [2,24,-1,1,1,-1,1,-1],
// 2 24 1 1 1 1 0 1
  [2,24,1,1,1,1,0,1],
// 2 24 1 1 -1 1 0 -1
  [2,24,1,1,-1,1,0,-1],
// 2 24 -1 1 1 -1 0 1
  [2,24,-1,1,1,-1,0,1],
// 2 24 -1 1 -1 -1 0 -1
  [2,24,-1,1,-1,-1,0,-1],
// 4 16 -1 1 -1 -1 1 1 1 1 1 1 1 -1
  [4,16,-1,1,-1,-1,1,1,1,1,1,1,1,-1],
// 4 16 -1 1 1 -1 0 1 1 0 1 1 1 1
  [4,16,-1,1,1,-1,0,1,1,0,1,1,1,1],
// 4 16 1 1 -1 1 0 -1 -1 0 -1 -1 1 -1
  [4,16,1,1,-1,1,0,-1,-1,0,-1,-1,1,-1],
];
module ldraw_lib__box3u2p(step=0, col=false, unit=2/5, alt=false, line=0.2, solid=!$preview)
    makepoly(ldraw_lib__box3u2p(), step=step, col=col, unit=unit, alt=alt, line=line, solid=solid);
ldraw_lib__box3u2p(line=0.2);
// file: s/3001s01.scad
use <../../lib.scad>
use <../../p/box3u2p.scad>
use <../../p/box5.scad>
use <../../p/stud.scad>
use <../../p/stud4.scad>
$fa=1; $fs=0.2;
function ldraw_lib__s__3001s01(realsolid=false) = [
// 0 ~Brick  2 x  4 without Front and Back Faces
// 0 Name: s\3001s01.dat
// 0 Author: James Jessiman
// 0 !LDRAW_ORG Subpart UPDATE 2004-03
// 0 !LICENSE Licensed under CC BY 2.0 and CC BY 4.0 : see CAreadme.txt
// 
// 0 BFC CERTIFY CCW
  [0,"BFC","CERTIFY"],
  [0,"BFC","CCW"],
// 
// 0 !HISTORY 2002-05-07 {unknown} BFC certification
// 0 !HISTORY 2002-05-07 [westrate] Unknown change
// 0 !HISTORY 2004-09-15 [PTadmin] Official Update 2004-03
// 0 !HISTORY 2007-08-29 [PTadmin] Header formatted for Contributor Agreement
// 0 !HISTORY 2008-07-01 [PTadmin] Official Update 2008-01
// 
// 
// 0 // Uncomment for front and back faces:
// 0 // 4 16 40 0 -20 -40 0 -20 -40 24 -20 40 24 -20
// 0 // 4 16 40 0 20 -40 0 20 -40 24 20 40 24
// 
// 1 16 20 4 0 1 0 0 0 -5 0 0 0 1 stud4.dat
  [1,16,20,4,0,1,0,0,0,-5,0,0,0,1, ldraw_lib__stud4(realsolid)],
// 1 16 0 4 0 1 0 0 0 -5 0 0 0 1 stud4.dat
  [1,16,0,4,0,1,0,0,0,-5,0,0,0,1, ldraw_lib__stud4(realsolid)],
// 1 16 -20 4 0 1 0 0 0 -5 0 0 0 1 stud4.dat
  [1,16,-20,4,0,1,0,0,0,-5,0,0,0,1, ldraw_lib__stud4(realsolid)],
// 0 BFC INVERTNEXT
  [0,"BFC","INVERTNEXT"],
// 1 16 0 24 0 36 0 0 0 -20 0 0 0 16 box5.dat
  [1,16,0,24,0,36,0,0,0,-20,0,0,0,16, ldraw_lib__box5(realsolid)],
// 4 16 40 24 20 36 24 16 -36 24 16 -40 24 20
  [4,16,40,24,20,36,24,16,-36,24,16,-40,24,20],
// 4 16 -40 24 20 -36 24 16 -36 24 -16 -40 24 -20
  [4,16,-40,24,20,-36,24,16,-36,24,-16,-40,24,-20],
// 4 16 -40 24 -20 -36 24 -16 36 24 -16 40 24 -20
  [4,16,-40,24,-20,-36,24,-16,36,24,-16,40,24,-20],
// 4 16 40 24 -20 36 24 -16 36 24 16 40 24 20
  [4,16,40,24,-20,36,24,-16,36,24,16,40,24,20],
// 1 16 0 24 0 0 0 40 0 -24 0 -20 0 0 box3u2p.dat
  [1,16,0,24,0,0,0,40,0,-24,0,-20,0,0, ldraw_lib__box3u2p(realsolid)],
// 2 24 -40 24 -20 40 24 -20
  [2,24,-40,24,-20,40,24,-20],
// 2 24 -40 24 20 40 24 20
  [2,24,-40,24,20,40,24,20],
// 1 16 30 0 10 1 0 0 0 1 0 0 0 1 stud.dat
  [1,16,30,0,10,1,0,0,0,1,0,0,0,1, ldraw_lib__stud(realsolid)],
// 1 16 10 0 10 1 0 0 0 1 0 0 0 1 stud.dat
  [1,16,10,0,10,1,0,0,0,1,0,0,0,1, ldraw_lib__stud(realsolid)],
// 1 16 -10 0 10 1 0 0 0 1 0 0 0 1 stud.dat
  [1,16,-10,0,10,1,0,0,0,1,0,0,0,1, ldraw_lib__stud(realsolid)],
// 1 16 -30 0 10 1 0 0 0 1 0 0 0 1 stud.dat
  [1,16,-30,0,10,1,0,0,0,1,0,0,0,1, ldraw_lib__stud(realsolid)],
// 1 16 30 0 -10 1 0 0 0 1 0 0 0 1 stud.dat
  [1,16,30,0,-10,1,0,0,0,1,0,0,0,1, ldraw_lib__stud(realsolid)],
// 1 16 10 0 -10 1 0 0 0 1 0 0 0 1 stud.dat
  [1,16,10,0,-10,1,0,0,0,1,0,0,0,1, ldraw_lib__stud(realsolid)],
// 1 16 -10 0 -10 1 0 0 0 1 0 0 0 1 stud.dat
  [1,16,-10,0,-10,1,0,0,0,1,0,0,0,1, ldraw_lib__stud(realsolid)],
// 1 16 -30 0 -10 1 0 0 0 1 0 0 0 1 stud.dat
  [1,16,-30,0,-10,1,0,0,0,1,0,0,0,1, ldraw_lib__stud(realsolid)],
// 0
];
module ldraw_lib__s__3001s01(step=0, col=false, unit=2/5, alt=false, line=0.2, solid=!$preview)
    makepoly(ldraw_lib__s__3001s01(solid), step=step, col=col, unit=unit, alt=alt, line=line, solid=solid);
ldraw_lib__s__3001s01(line=0.2);
// file: 3001.scad
use <../lib.scad>
use <s/3001s01.scad>
function ldraw_lib__3001() = [
// 0 Brick  2 x  4
// 0 Name: 3001.dat
// 0 Author: James Jessiman
// 0 !LDRAW_ORG Part UPDATE 2004-03
// 0 !LICENSE Licensed under CC BY 2.0 and CC BY 4.0 : see CAreadme.txt
// 
// 0 BFC CERTIFY CCW
  [0,"BFC","CERTIFY"],
  [0,"BFC","CCW"],
// 
// 0 !HISTORY 2002-05-07 {unknown} BFC Certification
// 0 !HISTORY 2002-06-11 [PTadmin] Official Update 2002-03
// 0 !HISTORY 2004-02-08 [Steffen] used s\3001s01.dat
// 0 !HISTORY 2004-09-15 [PTadmin] Official Update 2004-03
// 0 !HISTORY 2007-05-07 [PTadmin] Header formatted for Contributor Agreement
// 0 !HISTORY 2008-07-01 [PTadmin] Official Update 2008-01
// 
// 
// 1 16 0 0 0 1 0 0 0 1 0 0 0 1 s\3001s01.dat
  [1,16,0,0,0,1,0,0,0,1,0,0,0,1, ldraw_lib__s__3001s01()],
// 4 16 -40 0 -20 -40 24 -20 40 24 -20 40 0 -20
  [4,16,-40,0,-20,-40,24,-20,40,24,-20,40,0,-20],
// 4 16 40 0 20 40 24 20 -40 24 20 -40 0 20
  [4,16,40,0,20,40,24,20,-40,24,20,-40,0,20],
// 0
];
module ldraw_lib__3001(step=0, col=false, unit=2/5, alt=false, line=0.2, solid=!$preview)
    makepoly(ldraw_lib__3001(), step=step, col=col, unit=unit, alt=alt, line=line, solid=solid);
ldraw_lib__3001(line=0.2);
// main file
use <../lib.scad>
use <3001.scad>
function ldraw_lib__3556() = [
// 0 =Brick  2 x  4
// 0 Name: 3556.dat
// 0 Author: Massimo Maso [Sirio]
// 0 !LDRAW_ORG Part Alias UPDATE 2025-07
// 0 !LICENSE Licensed under CC BY 4.0 : see CAreadme.txt
// 
// 0 !HELP Unique number for Opal_Trans_Clear parts.
// 
// 0 BFC CERTIFY CCW
  [0,"BFC","CERTIFY"],
  [0,"BFC","CCW"],
// 
// 0 !KEYWORDS BrickLink 3001
// 
// 0 !HISTORY 2025-07-27 [OrionP] Official Update 2025-07
// 
// 1 16 0 0 0 1 0 0 0 1 0 0 0 1 3001.dat
  [1,16,0,0,0,1,0,0,0,1,0,0,0,1, ldraw_lib__3001()],
];
module ldraw_lib__3556(step=0, col=false, unit=2/5, alt=false, line=0.2, solid=!$preview)
    makepoly(ldraw_lib__3556(), step=step, col=col, unit=unit, alt=alt, line=line, solid=solid);
ldraw_lib__3556(line=0.2);
